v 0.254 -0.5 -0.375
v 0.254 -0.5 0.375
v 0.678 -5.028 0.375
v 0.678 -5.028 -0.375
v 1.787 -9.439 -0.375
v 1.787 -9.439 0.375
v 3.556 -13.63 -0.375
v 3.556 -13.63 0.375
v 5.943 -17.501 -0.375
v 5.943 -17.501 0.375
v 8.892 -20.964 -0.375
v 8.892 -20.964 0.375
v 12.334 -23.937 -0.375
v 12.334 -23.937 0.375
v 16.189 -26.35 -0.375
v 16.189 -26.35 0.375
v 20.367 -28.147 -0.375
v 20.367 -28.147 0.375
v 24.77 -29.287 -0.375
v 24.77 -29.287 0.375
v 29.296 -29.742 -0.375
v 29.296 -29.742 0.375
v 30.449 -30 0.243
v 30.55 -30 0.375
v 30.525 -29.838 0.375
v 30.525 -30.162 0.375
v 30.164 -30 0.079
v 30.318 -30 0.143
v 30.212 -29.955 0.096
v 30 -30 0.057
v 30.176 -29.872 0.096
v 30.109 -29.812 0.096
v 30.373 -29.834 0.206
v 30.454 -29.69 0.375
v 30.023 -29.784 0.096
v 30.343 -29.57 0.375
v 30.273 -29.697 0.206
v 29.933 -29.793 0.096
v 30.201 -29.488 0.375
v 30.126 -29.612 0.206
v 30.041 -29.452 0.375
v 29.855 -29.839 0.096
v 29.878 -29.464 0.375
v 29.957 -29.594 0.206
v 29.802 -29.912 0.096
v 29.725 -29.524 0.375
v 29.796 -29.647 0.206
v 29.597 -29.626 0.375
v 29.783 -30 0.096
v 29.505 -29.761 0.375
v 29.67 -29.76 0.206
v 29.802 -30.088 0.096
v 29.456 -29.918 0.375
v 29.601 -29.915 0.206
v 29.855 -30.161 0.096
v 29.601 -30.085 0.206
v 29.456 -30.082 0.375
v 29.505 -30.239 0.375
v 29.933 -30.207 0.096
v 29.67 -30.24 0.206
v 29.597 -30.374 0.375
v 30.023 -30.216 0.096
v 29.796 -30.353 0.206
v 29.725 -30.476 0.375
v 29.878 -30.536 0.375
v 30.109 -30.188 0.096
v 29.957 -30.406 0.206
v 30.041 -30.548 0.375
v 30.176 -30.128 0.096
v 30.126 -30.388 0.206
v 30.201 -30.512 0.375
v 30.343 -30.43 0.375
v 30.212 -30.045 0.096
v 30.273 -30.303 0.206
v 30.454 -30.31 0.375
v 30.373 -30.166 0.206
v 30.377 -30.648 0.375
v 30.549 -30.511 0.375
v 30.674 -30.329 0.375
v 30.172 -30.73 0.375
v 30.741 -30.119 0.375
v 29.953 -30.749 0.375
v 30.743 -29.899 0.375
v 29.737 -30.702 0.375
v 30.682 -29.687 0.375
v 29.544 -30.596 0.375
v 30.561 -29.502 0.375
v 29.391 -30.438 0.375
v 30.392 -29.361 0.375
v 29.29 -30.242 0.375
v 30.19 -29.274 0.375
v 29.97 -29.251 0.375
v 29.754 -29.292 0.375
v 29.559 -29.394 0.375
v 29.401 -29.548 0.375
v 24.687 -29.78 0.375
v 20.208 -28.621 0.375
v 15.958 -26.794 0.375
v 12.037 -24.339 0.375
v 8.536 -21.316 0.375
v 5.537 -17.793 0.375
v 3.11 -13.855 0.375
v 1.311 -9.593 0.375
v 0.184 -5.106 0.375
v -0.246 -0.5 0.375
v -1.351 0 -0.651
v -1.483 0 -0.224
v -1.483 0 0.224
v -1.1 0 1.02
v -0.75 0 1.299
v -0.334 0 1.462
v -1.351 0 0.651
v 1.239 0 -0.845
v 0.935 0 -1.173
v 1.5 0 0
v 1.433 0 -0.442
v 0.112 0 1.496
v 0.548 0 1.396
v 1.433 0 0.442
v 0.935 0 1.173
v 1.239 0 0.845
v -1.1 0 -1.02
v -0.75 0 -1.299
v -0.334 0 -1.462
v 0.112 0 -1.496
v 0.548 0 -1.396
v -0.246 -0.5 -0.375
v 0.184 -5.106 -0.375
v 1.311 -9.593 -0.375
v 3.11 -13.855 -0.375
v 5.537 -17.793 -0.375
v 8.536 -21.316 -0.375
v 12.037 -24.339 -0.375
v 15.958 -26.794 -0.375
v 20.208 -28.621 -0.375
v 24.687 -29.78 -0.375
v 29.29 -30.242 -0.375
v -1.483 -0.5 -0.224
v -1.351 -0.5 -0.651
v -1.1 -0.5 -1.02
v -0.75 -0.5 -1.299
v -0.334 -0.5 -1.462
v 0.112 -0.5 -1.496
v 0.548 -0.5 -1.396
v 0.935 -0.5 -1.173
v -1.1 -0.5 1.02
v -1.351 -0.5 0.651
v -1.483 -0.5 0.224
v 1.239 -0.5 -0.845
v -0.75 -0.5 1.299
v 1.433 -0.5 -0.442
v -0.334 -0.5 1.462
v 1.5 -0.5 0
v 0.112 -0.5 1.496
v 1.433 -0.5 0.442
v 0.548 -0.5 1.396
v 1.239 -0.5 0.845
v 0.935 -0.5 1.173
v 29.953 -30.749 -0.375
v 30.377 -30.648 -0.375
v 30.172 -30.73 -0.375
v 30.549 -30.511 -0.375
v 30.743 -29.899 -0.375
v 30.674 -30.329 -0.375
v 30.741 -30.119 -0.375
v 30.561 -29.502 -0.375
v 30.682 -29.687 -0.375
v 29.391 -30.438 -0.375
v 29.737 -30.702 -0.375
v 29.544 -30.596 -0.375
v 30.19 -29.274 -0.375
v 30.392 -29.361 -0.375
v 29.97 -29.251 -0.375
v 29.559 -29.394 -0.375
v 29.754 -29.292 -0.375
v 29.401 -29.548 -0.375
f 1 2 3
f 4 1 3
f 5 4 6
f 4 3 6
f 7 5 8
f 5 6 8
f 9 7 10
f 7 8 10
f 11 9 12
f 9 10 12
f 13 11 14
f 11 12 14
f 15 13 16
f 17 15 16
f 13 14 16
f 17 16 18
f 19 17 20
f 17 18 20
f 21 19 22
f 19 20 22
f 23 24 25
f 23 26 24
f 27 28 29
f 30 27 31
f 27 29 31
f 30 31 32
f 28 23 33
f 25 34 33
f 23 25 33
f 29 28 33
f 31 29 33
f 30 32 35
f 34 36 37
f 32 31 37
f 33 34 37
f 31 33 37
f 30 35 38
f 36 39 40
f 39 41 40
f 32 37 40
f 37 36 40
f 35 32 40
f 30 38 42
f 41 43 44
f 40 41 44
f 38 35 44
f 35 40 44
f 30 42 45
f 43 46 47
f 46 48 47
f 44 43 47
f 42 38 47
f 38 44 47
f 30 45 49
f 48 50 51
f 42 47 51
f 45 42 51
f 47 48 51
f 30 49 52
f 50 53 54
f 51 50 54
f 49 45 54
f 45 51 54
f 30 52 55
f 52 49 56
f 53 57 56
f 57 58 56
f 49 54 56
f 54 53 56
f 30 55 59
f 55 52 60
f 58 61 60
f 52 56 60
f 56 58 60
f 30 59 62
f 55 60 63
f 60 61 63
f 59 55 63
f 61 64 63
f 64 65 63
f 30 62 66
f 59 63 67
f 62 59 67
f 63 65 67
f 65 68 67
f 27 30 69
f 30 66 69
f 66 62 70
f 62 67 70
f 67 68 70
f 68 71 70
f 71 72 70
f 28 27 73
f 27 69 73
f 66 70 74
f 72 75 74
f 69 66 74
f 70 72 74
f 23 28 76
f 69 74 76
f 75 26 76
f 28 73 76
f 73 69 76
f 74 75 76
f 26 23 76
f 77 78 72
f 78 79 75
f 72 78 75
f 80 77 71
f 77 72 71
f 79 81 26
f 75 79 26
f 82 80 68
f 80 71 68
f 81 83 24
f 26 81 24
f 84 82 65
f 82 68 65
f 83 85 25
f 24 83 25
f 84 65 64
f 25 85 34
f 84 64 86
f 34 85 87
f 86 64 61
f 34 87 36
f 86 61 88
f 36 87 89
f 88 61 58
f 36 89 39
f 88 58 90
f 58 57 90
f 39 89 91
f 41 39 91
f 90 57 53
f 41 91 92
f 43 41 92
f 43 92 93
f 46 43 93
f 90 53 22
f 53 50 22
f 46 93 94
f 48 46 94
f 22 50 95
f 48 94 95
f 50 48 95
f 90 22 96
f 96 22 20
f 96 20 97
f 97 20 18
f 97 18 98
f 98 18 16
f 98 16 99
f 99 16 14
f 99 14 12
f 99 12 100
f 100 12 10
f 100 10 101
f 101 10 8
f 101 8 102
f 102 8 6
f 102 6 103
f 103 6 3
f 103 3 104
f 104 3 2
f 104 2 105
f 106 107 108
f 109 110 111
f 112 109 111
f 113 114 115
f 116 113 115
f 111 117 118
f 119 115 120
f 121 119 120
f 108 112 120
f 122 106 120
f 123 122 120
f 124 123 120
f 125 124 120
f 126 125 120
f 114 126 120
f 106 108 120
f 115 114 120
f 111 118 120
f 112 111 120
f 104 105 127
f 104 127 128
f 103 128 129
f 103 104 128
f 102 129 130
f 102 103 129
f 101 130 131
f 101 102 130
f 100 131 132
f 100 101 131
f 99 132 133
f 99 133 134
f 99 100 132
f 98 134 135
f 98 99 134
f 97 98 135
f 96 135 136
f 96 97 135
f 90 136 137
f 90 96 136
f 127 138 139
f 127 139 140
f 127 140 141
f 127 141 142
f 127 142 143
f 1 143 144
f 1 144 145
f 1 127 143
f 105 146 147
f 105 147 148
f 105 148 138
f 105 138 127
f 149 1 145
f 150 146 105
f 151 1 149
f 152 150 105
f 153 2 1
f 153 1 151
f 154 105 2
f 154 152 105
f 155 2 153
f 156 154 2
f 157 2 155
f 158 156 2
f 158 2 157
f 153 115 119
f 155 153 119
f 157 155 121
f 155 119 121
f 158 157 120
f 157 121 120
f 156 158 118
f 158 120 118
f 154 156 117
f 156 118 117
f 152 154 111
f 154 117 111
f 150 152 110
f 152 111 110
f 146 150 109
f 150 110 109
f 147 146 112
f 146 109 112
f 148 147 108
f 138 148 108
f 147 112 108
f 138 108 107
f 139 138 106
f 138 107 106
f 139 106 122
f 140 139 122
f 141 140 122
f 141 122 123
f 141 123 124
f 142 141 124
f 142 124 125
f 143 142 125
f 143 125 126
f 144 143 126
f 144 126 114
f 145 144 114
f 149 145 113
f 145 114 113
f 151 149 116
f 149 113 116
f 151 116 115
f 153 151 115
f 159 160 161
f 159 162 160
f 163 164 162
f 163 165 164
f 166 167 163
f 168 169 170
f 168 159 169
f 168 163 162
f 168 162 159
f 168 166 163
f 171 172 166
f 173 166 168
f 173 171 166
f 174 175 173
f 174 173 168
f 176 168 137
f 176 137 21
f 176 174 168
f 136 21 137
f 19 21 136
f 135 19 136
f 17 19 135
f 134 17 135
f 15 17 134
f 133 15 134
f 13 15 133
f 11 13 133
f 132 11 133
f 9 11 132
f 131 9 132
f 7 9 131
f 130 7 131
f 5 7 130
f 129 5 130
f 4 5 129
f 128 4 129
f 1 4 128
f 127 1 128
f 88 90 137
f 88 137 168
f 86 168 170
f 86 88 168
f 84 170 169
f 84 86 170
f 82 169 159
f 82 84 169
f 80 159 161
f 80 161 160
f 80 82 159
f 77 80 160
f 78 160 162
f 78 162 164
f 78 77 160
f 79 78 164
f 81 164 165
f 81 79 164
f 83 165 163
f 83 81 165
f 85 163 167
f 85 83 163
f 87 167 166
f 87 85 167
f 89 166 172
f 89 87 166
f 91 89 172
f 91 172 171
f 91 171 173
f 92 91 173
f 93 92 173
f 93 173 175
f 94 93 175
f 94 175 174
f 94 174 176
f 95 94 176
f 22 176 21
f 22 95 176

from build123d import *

# Parameters (mm, degrees)
PAD_DEPTH    = 0.375
SKETCH002_R  = 1.5
PAD001_DEPTH = 0.5


with BuildPart() as part:
    # Sketch → Pad (new body, symmetric)
    with BuildSketch(Plane.XY):
        with BuildLine():
            Line((-0.25, 0), (0, 0))
            Line((0, 0), (0.25, 0))
            ThreePointArc((0.25, 0), (8.71609, -20.785997), (29.295895, -29.741667))
            ThreePointArc((29.290002, -30.241667), (30.749948, -30.008839), (29.295895, -29.741667))
            ThreePointArc((-0.25, 0), (8.360454, -21.137467), (29.290002, -30.241667))
        make_face()
    extrude(amount=PAD_DEPTH, both=True)

    # Sketch002 → Pad001 (join)
    with BuildSketch(Plane.XZ):
        Circle(SKETCH002_R)
    extrude(amount=PAD001_DEPTH)

    # Sphere → Sphere (revolve, cut)
    with BuildSketch(Plane(origin=(30, -30, 0.6925), x_dir=(1, 0, 0), z_dir=(0, -1, 0))):
        with BuildLine():
            ThreePointArc((0, -0.635), (0.635, 0), (0, 0.635))
            Line((0, 0.635), (0, -0.635))
        make_face()
    revolve(axis=Axis((30, -30, 0.6925), (0, 0, 1)), mode=Mode.SUBTRACT)


solid = part.part
